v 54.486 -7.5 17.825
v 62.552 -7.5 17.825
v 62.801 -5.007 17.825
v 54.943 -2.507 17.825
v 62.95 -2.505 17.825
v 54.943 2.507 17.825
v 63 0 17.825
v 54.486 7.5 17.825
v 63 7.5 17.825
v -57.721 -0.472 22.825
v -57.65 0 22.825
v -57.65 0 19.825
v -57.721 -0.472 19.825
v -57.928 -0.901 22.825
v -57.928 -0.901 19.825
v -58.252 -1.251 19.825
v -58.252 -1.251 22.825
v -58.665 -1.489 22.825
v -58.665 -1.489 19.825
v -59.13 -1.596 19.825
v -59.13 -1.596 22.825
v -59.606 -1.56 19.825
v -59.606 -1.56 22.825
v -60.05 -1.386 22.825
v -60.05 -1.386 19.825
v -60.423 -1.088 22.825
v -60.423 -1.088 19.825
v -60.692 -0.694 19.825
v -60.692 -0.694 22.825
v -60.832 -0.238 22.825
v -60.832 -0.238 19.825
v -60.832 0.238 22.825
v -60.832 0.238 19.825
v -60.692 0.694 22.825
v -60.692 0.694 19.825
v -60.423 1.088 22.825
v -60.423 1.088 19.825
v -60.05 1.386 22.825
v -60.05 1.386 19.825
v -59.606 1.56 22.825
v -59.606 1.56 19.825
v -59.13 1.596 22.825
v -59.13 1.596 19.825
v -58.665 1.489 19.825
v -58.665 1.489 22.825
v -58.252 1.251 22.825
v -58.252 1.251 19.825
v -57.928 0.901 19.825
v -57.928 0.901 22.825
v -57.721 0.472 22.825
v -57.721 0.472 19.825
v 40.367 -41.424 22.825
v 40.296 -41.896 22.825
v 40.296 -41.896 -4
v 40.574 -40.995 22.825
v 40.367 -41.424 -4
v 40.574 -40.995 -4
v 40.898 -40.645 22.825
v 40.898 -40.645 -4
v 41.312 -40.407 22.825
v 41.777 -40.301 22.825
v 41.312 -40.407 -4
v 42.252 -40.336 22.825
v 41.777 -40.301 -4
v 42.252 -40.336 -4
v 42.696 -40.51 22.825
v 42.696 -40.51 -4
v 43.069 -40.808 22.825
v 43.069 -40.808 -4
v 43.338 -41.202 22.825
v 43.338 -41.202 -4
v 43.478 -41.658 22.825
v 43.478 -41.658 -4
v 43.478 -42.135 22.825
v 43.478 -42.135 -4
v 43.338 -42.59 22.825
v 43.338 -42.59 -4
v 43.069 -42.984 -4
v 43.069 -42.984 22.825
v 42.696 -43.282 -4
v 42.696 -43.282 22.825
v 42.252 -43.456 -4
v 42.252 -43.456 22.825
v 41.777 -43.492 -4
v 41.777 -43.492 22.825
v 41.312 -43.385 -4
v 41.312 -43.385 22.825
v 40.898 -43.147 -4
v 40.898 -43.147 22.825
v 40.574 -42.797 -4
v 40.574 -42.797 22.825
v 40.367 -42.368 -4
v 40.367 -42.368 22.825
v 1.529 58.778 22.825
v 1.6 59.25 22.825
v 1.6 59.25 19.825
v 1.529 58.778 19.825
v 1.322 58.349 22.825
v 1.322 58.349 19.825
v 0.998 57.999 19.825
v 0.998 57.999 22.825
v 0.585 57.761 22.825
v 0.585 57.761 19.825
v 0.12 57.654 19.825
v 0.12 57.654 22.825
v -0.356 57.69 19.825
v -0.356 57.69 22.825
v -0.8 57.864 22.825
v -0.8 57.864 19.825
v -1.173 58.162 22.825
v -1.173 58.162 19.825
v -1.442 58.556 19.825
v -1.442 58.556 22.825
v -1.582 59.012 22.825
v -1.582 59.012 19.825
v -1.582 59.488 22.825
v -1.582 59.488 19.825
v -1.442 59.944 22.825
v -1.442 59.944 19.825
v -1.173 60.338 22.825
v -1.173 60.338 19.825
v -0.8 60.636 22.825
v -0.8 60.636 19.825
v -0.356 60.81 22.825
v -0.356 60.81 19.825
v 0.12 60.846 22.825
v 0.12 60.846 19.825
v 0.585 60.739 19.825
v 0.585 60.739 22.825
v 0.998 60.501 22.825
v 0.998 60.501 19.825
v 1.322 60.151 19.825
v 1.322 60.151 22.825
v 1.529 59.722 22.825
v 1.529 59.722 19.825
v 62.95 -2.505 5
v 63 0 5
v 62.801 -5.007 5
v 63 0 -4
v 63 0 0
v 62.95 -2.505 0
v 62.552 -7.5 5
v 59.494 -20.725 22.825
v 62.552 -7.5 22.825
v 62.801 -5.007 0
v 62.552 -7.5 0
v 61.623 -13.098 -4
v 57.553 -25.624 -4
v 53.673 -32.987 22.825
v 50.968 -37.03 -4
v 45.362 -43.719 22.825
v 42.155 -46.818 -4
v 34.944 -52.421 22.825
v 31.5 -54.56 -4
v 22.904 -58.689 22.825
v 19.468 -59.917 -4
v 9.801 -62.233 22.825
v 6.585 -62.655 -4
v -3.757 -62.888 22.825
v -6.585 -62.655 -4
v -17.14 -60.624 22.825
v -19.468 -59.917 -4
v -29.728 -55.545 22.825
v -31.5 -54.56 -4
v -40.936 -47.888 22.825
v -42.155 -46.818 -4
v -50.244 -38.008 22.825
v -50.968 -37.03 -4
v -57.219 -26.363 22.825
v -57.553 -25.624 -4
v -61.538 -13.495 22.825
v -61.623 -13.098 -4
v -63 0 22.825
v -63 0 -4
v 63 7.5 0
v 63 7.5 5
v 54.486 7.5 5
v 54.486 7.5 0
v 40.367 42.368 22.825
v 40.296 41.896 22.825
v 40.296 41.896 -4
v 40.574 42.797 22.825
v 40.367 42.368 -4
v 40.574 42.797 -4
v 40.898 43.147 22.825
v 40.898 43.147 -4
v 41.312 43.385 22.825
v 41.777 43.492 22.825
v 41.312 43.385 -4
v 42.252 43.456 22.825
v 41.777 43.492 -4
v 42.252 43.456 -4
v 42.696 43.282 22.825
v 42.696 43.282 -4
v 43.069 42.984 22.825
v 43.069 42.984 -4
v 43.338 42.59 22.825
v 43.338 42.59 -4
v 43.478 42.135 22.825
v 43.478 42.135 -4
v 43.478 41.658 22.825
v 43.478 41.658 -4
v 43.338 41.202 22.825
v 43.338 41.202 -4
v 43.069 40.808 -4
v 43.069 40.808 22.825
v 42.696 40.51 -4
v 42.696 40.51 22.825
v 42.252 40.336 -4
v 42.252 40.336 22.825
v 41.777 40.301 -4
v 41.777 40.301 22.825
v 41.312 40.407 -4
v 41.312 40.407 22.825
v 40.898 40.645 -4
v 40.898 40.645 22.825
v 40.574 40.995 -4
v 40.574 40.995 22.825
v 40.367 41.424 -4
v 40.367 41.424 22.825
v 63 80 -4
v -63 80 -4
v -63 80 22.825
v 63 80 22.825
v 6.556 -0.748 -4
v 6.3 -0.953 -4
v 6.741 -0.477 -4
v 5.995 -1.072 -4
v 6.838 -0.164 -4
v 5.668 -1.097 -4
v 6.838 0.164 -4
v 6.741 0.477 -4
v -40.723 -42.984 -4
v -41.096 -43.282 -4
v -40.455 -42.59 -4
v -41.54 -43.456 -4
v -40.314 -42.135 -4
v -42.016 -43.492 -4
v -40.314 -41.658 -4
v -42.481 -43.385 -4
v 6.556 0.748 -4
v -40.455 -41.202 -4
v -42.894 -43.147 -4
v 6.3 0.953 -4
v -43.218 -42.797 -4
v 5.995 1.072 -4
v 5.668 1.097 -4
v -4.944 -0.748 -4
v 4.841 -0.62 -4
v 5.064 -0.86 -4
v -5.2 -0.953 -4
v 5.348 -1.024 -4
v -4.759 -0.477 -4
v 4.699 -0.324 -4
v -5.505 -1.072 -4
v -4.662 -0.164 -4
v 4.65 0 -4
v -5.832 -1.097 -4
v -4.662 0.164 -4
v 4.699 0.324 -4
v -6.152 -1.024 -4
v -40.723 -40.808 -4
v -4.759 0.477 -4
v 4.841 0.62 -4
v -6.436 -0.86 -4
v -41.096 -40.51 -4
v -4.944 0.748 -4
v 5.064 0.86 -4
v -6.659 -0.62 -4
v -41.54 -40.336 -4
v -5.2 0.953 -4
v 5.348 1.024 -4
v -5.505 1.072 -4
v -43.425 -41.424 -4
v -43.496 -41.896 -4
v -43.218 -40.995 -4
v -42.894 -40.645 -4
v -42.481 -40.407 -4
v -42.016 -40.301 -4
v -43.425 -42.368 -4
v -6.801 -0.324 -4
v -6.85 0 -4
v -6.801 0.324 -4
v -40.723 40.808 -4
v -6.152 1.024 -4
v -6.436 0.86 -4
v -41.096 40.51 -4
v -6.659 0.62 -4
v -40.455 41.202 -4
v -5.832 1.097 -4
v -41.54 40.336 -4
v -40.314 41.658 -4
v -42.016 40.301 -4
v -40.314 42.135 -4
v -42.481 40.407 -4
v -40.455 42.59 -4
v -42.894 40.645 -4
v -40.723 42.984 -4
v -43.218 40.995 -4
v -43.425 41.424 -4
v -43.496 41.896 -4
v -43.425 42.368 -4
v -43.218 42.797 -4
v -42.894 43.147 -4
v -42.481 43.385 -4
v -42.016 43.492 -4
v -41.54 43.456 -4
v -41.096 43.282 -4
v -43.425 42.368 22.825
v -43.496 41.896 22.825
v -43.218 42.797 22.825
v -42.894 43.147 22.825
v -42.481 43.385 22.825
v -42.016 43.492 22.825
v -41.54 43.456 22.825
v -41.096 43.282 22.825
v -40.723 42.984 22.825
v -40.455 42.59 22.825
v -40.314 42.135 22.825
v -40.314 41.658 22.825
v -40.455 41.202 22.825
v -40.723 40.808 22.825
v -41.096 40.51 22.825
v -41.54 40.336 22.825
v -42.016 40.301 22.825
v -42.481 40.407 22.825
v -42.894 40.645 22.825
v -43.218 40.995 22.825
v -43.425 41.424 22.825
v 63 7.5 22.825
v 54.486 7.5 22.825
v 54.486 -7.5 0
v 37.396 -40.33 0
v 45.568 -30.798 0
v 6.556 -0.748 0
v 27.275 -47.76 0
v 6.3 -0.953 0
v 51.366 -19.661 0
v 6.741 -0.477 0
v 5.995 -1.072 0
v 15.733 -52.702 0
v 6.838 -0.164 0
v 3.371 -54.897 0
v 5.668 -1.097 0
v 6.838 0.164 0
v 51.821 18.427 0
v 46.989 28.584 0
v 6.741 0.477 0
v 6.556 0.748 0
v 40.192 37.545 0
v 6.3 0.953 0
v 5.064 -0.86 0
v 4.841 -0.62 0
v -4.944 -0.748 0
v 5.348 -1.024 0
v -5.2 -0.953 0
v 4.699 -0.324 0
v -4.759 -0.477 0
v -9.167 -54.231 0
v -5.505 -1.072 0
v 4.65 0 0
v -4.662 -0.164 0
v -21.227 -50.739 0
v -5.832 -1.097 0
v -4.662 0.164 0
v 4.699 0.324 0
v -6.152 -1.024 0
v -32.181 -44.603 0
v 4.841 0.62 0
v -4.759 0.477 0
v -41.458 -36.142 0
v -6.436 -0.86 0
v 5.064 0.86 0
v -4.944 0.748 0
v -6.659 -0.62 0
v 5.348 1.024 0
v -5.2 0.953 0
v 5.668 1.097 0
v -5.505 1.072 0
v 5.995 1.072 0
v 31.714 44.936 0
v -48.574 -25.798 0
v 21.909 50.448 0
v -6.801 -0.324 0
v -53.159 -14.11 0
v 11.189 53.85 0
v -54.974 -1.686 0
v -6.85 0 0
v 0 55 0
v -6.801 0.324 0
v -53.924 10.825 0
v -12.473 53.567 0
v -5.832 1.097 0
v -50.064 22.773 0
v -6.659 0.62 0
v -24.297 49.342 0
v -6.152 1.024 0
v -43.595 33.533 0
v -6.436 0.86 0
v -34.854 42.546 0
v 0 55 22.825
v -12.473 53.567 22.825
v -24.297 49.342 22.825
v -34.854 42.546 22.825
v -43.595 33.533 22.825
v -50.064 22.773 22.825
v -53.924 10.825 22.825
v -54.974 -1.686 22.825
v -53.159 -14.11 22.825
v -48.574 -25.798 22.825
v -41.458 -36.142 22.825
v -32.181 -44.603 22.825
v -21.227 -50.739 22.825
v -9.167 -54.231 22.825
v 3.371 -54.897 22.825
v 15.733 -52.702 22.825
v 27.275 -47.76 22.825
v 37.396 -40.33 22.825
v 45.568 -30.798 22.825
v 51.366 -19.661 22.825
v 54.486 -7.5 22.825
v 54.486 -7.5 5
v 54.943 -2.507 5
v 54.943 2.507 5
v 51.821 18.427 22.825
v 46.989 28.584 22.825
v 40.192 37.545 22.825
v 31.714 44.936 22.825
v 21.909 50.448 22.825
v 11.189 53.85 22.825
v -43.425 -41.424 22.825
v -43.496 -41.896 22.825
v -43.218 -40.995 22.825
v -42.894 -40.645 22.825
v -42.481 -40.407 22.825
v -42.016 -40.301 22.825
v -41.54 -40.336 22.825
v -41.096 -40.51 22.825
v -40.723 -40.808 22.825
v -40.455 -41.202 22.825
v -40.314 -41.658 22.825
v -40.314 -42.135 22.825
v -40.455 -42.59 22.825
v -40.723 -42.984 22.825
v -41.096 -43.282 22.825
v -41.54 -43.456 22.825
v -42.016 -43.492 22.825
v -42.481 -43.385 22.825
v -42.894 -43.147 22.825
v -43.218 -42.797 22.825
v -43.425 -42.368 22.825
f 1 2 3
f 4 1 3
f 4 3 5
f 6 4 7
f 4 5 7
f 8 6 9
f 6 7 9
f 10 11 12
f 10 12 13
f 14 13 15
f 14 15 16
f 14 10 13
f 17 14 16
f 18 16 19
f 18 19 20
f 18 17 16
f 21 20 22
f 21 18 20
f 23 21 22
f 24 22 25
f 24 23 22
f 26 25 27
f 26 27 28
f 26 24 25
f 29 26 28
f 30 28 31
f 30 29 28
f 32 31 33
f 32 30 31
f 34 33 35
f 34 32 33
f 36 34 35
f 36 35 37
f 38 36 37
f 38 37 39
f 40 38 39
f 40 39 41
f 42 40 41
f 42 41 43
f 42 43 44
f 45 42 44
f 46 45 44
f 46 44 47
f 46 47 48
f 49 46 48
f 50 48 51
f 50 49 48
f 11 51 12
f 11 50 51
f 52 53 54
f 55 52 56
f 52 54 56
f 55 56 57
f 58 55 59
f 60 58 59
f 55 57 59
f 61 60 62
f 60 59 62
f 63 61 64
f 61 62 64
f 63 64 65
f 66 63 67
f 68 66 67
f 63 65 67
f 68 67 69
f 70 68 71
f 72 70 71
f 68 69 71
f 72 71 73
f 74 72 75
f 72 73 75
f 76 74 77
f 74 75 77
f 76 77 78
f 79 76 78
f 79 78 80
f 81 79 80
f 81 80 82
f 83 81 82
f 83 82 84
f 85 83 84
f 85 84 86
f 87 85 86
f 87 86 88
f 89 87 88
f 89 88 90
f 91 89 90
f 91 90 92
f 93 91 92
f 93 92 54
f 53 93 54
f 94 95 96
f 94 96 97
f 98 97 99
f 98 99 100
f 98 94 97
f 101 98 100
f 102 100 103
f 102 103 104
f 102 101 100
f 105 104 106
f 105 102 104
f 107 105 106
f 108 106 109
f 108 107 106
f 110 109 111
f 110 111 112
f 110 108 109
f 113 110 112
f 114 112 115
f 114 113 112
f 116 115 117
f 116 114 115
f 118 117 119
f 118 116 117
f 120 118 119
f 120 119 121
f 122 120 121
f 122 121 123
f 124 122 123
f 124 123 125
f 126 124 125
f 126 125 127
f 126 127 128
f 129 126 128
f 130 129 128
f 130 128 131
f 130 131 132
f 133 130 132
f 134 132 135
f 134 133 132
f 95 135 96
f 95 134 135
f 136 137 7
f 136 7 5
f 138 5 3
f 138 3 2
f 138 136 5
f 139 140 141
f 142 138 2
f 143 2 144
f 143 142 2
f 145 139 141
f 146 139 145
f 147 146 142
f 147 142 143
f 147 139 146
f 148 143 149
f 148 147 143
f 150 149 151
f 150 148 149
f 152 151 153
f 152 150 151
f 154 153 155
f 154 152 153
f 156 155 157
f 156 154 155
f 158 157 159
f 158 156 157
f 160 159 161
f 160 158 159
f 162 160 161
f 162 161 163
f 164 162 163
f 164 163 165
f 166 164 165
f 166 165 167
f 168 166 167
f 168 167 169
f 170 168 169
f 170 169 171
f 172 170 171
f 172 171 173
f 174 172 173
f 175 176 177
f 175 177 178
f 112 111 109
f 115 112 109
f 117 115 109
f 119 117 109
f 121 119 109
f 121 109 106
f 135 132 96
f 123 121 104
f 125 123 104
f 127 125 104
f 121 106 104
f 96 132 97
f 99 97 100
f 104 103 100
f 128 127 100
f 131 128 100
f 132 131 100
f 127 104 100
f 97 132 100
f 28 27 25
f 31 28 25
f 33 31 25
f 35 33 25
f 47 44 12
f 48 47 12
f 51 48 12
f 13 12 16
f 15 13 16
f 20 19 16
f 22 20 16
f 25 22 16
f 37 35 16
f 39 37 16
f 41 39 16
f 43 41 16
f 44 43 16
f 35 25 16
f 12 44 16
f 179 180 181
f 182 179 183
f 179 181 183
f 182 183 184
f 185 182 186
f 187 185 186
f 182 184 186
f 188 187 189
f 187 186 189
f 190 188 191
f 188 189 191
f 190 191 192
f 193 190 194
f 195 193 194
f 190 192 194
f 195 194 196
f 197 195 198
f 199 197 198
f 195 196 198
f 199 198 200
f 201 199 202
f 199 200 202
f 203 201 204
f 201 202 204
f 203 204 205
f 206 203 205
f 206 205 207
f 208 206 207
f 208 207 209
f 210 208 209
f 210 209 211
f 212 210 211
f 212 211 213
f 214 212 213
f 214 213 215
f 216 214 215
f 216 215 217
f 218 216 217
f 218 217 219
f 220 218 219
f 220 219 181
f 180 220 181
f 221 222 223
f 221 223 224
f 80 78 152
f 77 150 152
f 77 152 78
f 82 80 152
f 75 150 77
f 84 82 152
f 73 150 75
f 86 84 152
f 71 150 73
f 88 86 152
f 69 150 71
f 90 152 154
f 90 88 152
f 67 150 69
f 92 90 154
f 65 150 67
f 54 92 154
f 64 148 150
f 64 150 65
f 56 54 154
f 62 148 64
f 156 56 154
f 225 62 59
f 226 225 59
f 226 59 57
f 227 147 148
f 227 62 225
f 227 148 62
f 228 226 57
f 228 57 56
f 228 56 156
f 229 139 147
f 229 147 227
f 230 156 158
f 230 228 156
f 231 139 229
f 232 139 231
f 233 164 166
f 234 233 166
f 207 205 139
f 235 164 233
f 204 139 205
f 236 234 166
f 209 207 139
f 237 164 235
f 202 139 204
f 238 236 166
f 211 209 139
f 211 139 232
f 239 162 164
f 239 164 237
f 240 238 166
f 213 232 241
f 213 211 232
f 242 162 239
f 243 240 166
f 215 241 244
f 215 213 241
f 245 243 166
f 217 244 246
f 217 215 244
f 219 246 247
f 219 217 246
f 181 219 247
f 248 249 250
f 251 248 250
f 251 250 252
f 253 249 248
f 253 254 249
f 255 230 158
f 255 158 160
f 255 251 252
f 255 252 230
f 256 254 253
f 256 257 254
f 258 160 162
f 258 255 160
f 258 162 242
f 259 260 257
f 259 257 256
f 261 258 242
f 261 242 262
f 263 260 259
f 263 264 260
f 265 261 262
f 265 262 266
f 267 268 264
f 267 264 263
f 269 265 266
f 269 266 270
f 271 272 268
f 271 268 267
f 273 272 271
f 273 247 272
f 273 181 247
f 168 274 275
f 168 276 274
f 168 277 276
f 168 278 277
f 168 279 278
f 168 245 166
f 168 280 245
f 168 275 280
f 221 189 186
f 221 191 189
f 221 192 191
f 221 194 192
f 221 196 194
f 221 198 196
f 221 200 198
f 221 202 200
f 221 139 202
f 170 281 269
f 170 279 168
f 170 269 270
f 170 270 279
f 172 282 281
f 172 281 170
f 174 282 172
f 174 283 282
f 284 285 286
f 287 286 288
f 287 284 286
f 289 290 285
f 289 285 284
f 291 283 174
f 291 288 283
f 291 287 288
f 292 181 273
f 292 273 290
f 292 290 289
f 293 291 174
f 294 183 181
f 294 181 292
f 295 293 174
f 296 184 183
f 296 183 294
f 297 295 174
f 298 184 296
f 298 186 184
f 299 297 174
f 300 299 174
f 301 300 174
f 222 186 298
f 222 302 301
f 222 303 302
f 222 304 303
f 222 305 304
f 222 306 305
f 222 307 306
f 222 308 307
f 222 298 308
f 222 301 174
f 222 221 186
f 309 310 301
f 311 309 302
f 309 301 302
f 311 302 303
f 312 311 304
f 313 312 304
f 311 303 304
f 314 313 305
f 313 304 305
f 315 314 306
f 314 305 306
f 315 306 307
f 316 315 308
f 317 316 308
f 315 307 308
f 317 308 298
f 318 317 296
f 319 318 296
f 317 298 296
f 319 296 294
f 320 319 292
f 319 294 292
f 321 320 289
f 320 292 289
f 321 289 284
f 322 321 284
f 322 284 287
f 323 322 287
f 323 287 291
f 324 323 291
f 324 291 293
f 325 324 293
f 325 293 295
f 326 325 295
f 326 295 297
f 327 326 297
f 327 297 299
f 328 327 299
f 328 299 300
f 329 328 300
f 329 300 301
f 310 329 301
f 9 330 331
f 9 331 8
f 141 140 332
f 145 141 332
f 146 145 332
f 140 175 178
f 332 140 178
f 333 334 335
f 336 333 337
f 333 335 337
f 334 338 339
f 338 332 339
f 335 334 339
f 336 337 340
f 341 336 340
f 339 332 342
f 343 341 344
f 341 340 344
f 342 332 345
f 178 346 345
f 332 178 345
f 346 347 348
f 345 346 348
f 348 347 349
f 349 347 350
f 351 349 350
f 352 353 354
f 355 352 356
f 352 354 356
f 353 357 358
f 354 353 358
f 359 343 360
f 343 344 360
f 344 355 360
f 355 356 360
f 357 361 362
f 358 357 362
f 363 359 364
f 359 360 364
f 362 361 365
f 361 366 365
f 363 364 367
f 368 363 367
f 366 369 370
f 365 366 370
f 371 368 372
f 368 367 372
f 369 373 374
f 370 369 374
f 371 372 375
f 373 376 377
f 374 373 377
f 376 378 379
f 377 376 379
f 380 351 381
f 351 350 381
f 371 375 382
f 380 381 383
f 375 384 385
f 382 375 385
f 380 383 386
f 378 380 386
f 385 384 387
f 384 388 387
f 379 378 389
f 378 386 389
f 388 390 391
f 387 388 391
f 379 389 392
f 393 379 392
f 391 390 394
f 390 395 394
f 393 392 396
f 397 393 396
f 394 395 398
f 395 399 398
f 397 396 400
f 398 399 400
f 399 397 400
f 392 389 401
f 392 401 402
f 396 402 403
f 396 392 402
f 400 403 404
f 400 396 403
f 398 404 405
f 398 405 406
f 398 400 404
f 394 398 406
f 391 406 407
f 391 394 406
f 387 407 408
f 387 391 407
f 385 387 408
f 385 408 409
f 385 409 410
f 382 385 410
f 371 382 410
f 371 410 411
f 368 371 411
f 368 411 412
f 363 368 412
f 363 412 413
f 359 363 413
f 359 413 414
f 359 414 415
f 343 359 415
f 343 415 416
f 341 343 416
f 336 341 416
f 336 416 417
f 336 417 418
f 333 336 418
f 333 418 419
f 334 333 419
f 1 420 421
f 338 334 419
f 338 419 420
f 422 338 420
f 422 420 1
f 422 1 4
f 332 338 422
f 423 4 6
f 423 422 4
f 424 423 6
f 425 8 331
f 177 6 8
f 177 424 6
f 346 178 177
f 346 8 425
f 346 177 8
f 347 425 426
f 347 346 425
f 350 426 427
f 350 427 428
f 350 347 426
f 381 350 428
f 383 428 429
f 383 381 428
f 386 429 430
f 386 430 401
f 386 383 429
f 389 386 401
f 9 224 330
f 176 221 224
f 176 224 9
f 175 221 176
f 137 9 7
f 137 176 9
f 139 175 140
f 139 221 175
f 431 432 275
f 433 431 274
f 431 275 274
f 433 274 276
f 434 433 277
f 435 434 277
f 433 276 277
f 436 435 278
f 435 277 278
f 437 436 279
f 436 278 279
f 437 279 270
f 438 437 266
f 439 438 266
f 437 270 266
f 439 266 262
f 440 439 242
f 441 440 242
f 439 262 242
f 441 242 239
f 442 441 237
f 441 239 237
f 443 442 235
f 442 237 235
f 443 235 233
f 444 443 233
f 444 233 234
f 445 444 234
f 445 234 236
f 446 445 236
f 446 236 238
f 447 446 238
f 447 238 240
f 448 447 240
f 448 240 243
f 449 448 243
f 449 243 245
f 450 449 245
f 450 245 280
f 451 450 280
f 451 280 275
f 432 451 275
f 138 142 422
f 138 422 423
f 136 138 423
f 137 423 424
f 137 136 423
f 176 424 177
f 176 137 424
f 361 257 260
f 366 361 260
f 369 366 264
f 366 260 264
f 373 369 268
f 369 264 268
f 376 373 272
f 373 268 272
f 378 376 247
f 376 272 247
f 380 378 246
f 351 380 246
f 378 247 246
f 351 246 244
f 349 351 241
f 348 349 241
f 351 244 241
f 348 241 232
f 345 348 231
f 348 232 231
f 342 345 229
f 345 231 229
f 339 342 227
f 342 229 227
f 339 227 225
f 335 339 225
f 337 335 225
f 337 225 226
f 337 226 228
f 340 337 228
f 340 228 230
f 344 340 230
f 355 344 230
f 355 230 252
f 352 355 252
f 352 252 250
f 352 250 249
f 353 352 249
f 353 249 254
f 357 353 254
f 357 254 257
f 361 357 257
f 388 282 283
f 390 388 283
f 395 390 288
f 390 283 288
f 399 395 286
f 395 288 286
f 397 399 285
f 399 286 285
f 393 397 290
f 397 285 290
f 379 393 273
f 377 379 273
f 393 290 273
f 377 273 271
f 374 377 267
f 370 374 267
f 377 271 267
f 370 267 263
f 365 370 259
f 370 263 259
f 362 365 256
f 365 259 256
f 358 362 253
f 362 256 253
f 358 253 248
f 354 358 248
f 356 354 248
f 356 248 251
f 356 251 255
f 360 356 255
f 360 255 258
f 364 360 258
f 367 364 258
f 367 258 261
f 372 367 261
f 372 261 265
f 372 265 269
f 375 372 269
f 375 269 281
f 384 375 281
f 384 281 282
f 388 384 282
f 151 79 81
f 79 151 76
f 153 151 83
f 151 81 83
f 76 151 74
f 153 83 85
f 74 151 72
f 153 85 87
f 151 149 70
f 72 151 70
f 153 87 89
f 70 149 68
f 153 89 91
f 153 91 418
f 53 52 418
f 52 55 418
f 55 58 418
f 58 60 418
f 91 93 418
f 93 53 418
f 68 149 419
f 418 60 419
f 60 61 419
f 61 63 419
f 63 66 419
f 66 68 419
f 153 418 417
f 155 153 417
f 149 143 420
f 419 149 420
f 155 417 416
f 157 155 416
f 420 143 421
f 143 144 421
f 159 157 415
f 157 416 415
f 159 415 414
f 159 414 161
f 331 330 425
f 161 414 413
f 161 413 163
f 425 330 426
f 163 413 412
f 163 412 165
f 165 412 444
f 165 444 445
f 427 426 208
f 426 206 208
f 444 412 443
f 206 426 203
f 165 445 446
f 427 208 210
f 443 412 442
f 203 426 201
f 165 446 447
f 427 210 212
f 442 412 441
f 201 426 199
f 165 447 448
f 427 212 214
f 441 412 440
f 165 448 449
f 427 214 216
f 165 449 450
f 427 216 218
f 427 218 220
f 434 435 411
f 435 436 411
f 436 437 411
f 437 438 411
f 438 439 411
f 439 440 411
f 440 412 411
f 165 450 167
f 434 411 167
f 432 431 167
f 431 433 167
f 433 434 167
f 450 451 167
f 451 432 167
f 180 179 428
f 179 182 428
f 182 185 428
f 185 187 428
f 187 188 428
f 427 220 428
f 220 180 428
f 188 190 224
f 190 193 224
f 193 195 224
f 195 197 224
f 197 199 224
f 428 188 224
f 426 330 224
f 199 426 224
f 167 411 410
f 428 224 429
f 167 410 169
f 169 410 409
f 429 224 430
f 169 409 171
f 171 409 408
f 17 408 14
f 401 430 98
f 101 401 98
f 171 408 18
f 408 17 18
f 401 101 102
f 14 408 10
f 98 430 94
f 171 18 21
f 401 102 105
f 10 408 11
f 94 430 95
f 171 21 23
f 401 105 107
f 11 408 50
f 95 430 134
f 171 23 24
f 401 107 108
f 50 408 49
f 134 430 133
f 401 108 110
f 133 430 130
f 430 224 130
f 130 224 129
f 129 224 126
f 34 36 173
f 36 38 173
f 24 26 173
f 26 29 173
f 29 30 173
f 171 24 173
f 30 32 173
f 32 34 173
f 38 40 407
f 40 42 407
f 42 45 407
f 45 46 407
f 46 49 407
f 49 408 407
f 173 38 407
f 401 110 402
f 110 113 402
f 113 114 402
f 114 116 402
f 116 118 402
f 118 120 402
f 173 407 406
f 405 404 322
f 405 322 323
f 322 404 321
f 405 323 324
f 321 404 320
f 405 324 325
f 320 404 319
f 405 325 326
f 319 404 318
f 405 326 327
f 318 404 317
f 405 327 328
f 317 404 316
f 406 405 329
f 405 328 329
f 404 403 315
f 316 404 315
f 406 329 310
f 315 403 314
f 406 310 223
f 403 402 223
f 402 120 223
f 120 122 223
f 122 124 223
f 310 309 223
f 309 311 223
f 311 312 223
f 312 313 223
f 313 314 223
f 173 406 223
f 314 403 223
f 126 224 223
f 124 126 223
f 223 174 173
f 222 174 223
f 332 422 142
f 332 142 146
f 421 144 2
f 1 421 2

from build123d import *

# Parameters (mm, degrees)
SKETCH1_R               = 55
BOSS_EXTRUDE1_DEPTH     = 22.825
CUT_EXTRUDE1_REACH      = 152.987
CUT_EXTRUDE1_END_RADIUS = 55
SKETCH3_W               = 5
SKETCH3_H               = 15
BOSS_EXTRUDE2_START     = 4
BOSS_EXTRUDE2_DEPTH     = 4
CUT_EXTRUDE2_REACH      = 107.302
SKETCH6_R               = 1.1
CUT_EXTRUDE3_REACH      = 107.302
SKETCH7_R               = 1.6
CUT_EXTRUDE4_START      = -26.825
SKETCH7_3_R             = 1.6
CUT_EXTRUDE4_DEPTH      = 3


with BuildPart() as part:
    # Sketch1 → Boss-Extrude1 (new body)
    with BuildSketch(Plane.XY):
        with BuildLine():
            Line((-63, 80), (63, 80))
            Line((63, 80), (63, 0))
            ThreePointArc((63, 0), (0, -63), (-63, 0))
            Line((-63, 0), (-63, 80))
        make_face()
        with Locations(Location((0, 0, 0), (0, 0, 90))):
            Circle(SKETCH1_R, mode=Mode.SUBTRACT)
    extrude(amount=BOSS_EXTRUDE1_DEPTH)

    # Cut-Extrude1: up to this cylinder (the profile starts outside it)
    cut_extrude1_end = Plane(origin=(0, 0, 11.4125), z_dir=(0, 0, -1)) * Cylinder(CUT_EXTRUDE1_END_RADIUS, 434.799, mode=Mode.PRIVATE)
    # Sketch3 → Cut-Extrude1 (cut, up to the surface)
    with BuildSketch(Plane(origin=(63, 0, 0), x_dir=(0, 0, -1), z_dir=(1, 0, 0)), mode=Mode.PRIVATE) as cut_extrude1_sk1:
        with Locations((-2.5, 0)):
            Rectangle(SKETCH3_W, SKETCH3_H)
    cut_extrude1_tool1 = extrude(cut_extrude1_sk1.sketch, amount=-CUT_EXTRUDE1_REACH, mode=Mode.PRIVATE) - cut_extrude1_end
    add(cut_extrude1_tool1.solids().sort_by_distance((63, 0, 2.5))[0], mode=Mode.SUBTRACT)
    # Sketch3 → Cut-Extrude1 (cut, up to the surface)
    with BuildSketch(Plane(origin=(63, 0, 0), x_dir=(0, 0, -1), z_dir=(1, 0, 0)), mode=Mode.PRIVATE) as cut_extrude1_sk2:
        with Locations((-20.325, 0)):
            Rectangle(SKETCH3_W, SKETCH3_H)
    cut_extrude1_tool2 = extrude(cut_extrude1_sk2.sketch, amount=-CUT_EXTRUDE1_REACH, mode=Mode.PRIVATE) - cut_extrude1_end
    add(cut_extrude1_tool2.solids().sort_by_distance((63, 0, 20.325))[0], mode=Mode.SUBTRACT)

    # Sketch4 → Boss-Extrude2 (add)
    with BuildSketch(Plane(origin=(0, 0, 0), x_dir=(-1, 0, 0), z_dir=(0, 0, -1)).offset(BOSS_EXTRUDE2_START)):
        with BuildLine():
            Line((63, 0), (63, 80))
            Line((63, 80), (-63, 80))
            Line((-63, 80), (-63, 0))
            ThreePointArc((-63, 0), (0, -63), (63, 0))
        make_face()
    extrude(amount=-BOSS_EXTRUDE2_DEPTH)

    # Sketch6 → Cut-Extrude2 (cut, up to next)
    with BuildSketch(Plane(origin=(0, 0, -4), x_dir=(-1, 0, 0), z_dir=(0, 0, -1)), mode=Mode.PRIVATE) as cut_extrude2_sk1:
        with Locations((5.75, 0)):
            Circle(SKETCH6_R)
    cut_extrude2_tool1 = extrude(cut_extrude2_sk1.sketch, amount=-CUT_EXTRUDE2_REACH, mode=Mode.PRIVATE) & part.part
    # Sketch6 → Cut-Extrude2 (cut, up to next)
    with BuildSketch(Plane(origin=(0, 0, -4), x_dir=(-1, 0, 0), z_dir=(0, 0, -1)), mode=Mode.PRIVATE) as cut_extrude2_sk2:
        with Locations((-5.75, 0)):
            Circle(SKETCH6_R)
    cut_extrude2_tool2 = extrude(cut_extrude2_sk2.sketch, amount=-CUT_EXTRUDE2_REACH, mode=Mode.PRIVATE) & part.part
    add(cut_extrude2_tool1.solids().sort_by_distance((-5.75, 0, -4))[0], mode=Mode.SUBTRACT)
    add(cut_extrude2_tool2.solids().sort_by_distance((5.75, 0, -4))[0], mode=Mode.SUBTRACT)

    # Sketch7 → Cut-Extrude3 (cut, up to next)
    with BuildSketch(Plane(origin=(0, 0, -4), x_dir=(-1, 0, 0), z_dir=(0, 0, -1)), mode=Mode.PRIVATE) as cut_extrude3_sk1:
        with Locations((-41.896076785, 41.896076785)):
            Circle(SKETCH7_R)
    cut_extrude3_tool1 = extrude(cut_extrude3_sk1.sketch, amount=-CUT_EXTRUDE3_REACH, mode=Mode.PRIVATE) & part.part
    # Sketch7 → Cut-Extrude3 (cut, up to next)
    with BuildSketch(Plane(origin=(0, 0, -4), x_dir=(-1, 0, 0), z_dir=(0, 0, -1)), mode=Mode.PRIVATE) as cut_extrude3_sk2:
        with Locations((-41.896076785, -41.896076785)):
            Circle(SKETCH7_R)
    cut_extrude3_tool2 = extrude(cut_extrude3_sk2.sketch, amount=-CUT_EXTRUDE3_REACH, mode=Mode.PRIVATE) & part.part
    # Sketch7 → Cut-Extrude3 (cut, up to next)
    with BuildSketch(Plane(origin=(0, 0, -4), x_dir=(-1, 0, 0), z_dir=(0, 0, -1)), mode=Mode.PRIVATE) as cut_extrude3_sk3:
        with Locations((41.896076785, -41.896076785)):
            Circle(SKETCH7_R)
    cut_extrude3_tool3 = extrude(cut_extrude3_sk3.sketch, amount=-CUT_EXTRUDE3_REACH, mode=Mode.PRIVATE) & part.part
    # Sketch7 → Cut-Extrude3 (cut, up to next)
    with BuildSketch(Plane(origin=(0, 0, -4), x_dir=(-1, 0, 0), z_dir=(0, 0, -1)), mode=Mode.PRIVATE) as cut_extrude3_sk4:
        with Locations((41.896076785, 41.896076785)):
            Circle(SKETCH7_R)
    cut_extrude3_tool4 = extrude(cut_extrude3_sk4.sketch, amount=-CUT_EXTRUDE3_REACH, mode=Mode.PRIVATE) & part.part
    add(cut_extrude3_tool1.solids().sort_by_distance((41.896077, 41.896077, -4))[0], mode=Mode.SUBTRACT)
    add(cut_extrude3_tool2.solids().sort_by_distance((41.896077, -41.896077, -4))[0], mode=Mode.SUBTRACT)
    add(cut_extrude3_tool3.solids().sort_by_distance((-41.896077, -41.896077, -4))[0], mode=Mode.SUBTRACT)
    add(cut_extrude3_tool4.solids().sort_by_distance((-41.896077, 41.896077, -4))[0], mode=Mode.SUBTRACT)

    # Sketch7<3> → Cut-Extrude4 (cut)
    with BuildSketch(Plane(origin=(0, 0, -4), x_dir=(-1, 0, 0), z_dir=(0, 0, -1)).offset(CUT_EXTRUDE4_START)):
        with Locations(Location((59.25, 0, 0), (0, 0, 180))):
            Circle(SKETCH7_3_R)
        with Locations(Location((0, 59.25, 0), (0, 0, 180))):
            Circle(SKETCH7_3_R)
    extrude(amount=CUT_EXTRUDE4_DEPTH, mode=Mode.SUBTRACT)


solid = part.part
